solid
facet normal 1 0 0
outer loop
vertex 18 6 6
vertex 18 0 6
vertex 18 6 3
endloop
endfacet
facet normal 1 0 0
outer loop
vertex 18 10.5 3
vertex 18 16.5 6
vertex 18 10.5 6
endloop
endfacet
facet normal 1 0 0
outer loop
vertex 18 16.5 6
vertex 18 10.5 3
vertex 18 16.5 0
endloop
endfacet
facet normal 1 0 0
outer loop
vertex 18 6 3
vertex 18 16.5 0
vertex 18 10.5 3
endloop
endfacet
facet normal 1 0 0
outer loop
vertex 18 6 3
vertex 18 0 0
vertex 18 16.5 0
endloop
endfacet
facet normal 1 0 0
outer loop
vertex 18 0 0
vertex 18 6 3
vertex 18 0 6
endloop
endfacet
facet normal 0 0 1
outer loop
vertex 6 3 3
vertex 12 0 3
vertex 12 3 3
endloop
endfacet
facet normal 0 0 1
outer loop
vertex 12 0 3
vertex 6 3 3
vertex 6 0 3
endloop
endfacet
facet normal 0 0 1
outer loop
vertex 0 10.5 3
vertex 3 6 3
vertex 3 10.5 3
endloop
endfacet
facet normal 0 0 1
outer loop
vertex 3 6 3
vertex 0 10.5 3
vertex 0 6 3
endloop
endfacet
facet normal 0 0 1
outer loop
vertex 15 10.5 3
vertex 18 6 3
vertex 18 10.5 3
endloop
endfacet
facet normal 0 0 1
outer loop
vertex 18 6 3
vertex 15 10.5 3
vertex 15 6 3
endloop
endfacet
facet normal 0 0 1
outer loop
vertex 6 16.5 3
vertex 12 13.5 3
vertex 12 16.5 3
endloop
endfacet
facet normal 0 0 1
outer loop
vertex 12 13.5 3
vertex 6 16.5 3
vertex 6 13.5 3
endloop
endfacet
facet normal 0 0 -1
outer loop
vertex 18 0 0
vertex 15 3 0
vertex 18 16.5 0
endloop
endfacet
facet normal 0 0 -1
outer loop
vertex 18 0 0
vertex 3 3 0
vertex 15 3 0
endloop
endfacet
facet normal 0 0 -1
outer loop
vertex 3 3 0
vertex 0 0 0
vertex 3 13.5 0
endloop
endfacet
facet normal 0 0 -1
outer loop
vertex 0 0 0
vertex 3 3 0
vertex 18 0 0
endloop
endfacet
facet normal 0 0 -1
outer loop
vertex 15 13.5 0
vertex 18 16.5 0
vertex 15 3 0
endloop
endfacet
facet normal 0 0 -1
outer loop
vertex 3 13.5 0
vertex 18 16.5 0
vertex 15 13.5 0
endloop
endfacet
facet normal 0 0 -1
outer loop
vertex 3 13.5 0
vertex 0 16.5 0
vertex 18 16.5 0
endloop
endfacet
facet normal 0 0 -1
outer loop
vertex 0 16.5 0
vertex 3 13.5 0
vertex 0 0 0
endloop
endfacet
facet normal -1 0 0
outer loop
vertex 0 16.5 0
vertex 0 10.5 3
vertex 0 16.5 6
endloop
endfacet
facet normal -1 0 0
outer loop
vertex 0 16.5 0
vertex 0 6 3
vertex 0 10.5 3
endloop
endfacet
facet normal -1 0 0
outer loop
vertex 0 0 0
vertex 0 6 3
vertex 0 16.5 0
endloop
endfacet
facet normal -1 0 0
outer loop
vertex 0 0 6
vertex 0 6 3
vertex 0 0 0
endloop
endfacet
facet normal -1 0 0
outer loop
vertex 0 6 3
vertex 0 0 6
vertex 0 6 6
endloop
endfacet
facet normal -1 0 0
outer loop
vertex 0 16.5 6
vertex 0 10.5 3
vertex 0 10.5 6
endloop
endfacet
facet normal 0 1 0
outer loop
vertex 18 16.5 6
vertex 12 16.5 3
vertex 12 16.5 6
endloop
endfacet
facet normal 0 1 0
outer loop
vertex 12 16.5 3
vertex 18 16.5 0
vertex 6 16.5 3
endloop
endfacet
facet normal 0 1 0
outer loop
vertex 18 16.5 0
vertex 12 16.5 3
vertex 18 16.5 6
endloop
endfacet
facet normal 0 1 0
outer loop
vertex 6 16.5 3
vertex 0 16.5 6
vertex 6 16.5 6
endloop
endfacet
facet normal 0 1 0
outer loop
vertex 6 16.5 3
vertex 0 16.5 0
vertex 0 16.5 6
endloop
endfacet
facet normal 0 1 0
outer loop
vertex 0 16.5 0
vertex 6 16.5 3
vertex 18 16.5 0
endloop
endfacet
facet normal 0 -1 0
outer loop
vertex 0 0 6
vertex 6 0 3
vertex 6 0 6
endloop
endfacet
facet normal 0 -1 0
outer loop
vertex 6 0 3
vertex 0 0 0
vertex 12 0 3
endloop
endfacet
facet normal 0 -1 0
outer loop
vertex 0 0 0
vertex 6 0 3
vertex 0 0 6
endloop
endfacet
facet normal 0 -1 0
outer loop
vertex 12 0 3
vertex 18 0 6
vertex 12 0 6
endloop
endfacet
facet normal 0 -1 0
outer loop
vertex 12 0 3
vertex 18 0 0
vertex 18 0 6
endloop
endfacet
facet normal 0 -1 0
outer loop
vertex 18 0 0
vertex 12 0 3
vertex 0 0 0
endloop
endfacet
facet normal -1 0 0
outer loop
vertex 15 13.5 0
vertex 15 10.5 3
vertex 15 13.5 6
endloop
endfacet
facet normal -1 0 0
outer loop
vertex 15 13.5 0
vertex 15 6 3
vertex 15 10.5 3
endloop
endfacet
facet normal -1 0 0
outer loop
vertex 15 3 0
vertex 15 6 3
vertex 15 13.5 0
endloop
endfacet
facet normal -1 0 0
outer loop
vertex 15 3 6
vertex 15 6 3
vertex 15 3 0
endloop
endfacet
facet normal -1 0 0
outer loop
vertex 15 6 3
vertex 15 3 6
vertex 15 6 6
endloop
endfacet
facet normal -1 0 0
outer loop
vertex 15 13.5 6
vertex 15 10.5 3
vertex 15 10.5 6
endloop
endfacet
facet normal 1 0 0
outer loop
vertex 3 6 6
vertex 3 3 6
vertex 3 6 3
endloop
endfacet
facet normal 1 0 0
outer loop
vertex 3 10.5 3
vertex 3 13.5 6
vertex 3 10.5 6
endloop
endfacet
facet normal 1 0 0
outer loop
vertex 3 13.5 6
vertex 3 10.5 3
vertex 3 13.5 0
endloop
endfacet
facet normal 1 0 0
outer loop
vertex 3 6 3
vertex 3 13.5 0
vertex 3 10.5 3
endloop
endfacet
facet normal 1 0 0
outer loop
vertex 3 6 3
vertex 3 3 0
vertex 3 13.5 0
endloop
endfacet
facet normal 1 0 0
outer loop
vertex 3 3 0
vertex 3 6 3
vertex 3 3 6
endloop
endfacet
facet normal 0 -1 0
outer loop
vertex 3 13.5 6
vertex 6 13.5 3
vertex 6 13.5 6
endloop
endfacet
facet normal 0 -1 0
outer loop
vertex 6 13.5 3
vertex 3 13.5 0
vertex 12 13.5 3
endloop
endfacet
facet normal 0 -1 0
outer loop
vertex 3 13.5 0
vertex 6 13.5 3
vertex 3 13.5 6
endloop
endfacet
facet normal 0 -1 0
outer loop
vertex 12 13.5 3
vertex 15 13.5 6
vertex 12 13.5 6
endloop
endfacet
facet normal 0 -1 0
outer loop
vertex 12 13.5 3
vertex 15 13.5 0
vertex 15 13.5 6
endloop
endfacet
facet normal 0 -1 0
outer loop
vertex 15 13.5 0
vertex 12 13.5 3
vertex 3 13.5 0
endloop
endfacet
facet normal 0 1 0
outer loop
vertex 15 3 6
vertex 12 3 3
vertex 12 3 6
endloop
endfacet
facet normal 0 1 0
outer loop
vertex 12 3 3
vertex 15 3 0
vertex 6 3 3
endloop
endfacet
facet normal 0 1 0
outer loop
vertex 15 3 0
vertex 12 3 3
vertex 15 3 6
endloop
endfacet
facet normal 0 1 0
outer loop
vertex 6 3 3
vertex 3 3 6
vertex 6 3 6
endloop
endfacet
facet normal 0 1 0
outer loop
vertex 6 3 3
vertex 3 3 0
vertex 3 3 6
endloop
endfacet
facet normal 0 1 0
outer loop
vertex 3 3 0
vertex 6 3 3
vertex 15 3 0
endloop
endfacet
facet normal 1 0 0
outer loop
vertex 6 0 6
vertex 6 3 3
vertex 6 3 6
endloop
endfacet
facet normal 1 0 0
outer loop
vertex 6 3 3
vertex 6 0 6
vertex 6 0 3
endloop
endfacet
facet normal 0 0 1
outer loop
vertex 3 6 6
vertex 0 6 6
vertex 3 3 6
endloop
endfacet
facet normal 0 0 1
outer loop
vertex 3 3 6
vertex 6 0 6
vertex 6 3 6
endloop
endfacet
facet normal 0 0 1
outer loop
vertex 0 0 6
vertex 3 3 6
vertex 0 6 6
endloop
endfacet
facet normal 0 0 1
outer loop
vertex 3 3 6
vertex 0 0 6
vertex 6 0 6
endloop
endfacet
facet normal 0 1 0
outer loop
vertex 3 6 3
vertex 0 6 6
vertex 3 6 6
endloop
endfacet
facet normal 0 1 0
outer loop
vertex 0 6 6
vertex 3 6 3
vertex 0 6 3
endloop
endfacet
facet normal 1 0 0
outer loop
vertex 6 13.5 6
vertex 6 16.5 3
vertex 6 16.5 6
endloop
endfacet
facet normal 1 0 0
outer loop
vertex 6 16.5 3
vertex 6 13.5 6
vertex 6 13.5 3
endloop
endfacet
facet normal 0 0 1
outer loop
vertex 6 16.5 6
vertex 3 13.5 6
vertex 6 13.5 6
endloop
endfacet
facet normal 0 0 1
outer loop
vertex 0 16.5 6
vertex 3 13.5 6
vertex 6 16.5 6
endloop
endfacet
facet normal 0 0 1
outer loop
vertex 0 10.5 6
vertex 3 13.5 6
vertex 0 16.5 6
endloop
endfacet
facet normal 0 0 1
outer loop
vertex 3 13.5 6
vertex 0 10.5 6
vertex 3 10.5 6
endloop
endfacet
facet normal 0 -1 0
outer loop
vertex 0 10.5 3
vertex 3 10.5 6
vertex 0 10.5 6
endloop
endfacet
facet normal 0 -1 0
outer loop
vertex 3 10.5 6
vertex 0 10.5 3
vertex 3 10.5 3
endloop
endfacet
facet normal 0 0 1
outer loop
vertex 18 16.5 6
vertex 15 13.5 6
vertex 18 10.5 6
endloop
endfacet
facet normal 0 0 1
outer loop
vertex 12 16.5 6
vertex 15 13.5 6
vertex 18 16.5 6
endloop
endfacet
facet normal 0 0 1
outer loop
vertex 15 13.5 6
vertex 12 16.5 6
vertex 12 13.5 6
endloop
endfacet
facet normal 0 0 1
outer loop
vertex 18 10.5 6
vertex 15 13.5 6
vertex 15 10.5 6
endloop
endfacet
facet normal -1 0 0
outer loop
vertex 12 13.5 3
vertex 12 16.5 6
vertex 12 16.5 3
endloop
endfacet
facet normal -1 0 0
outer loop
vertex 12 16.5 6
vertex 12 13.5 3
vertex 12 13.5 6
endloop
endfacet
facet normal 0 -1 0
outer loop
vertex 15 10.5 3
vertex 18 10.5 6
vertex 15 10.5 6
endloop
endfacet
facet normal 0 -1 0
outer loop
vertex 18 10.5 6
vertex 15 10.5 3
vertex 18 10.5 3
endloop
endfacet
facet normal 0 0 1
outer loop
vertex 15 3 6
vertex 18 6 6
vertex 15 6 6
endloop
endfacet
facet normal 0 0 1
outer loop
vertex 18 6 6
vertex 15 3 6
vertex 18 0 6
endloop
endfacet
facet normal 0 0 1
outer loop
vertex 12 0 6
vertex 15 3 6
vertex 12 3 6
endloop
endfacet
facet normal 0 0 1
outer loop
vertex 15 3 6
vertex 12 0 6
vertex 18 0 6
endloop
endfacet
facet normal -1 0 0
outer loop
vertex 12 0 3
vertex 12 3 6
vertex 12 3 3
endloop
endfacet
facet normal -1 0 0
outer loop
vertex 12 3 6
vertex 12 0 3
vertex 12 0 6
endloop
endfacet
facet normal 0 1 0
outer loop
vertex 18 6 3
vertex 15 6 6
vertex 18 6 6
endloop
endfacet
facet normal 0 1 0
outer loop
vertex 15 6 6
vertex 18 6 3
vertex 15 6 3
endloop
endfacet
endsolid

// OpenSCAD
pot_width = 12;
pot_length = 10.5;
pot_height = 3;
pot_margin = 6;

legs_height = 3;

difference() {
    cube([pot_width + pot_margin, pot_length + pot_margin, pot_height]);
    translate([pot_margin/2, pot_margin/2, 0]) {
        cube([pot_width, pot_length, pot_height]);
    }
}

difference() {
    union() {
        translate([0, 0, pot_height]) {
            cube([pot_margin, pot_margin, legs_height]);
        }

        translate([0, pot_length, pot_height]) {
            cube([pot_margin, pot_margin, legs_height]);
        }

        translate([pot_width, pot_length, pot_height]) {
            cube([pot_margin, pot_margin, legs_height]);
        }

        translate([pot_width, 0, pot_height]) {
            cube([pot_margin, pot_margin, legs_height]);
        }
    }
    
    translate([pot_margin/2, pot_margin/2, 0]) {
        cube([pot_width, pot_length, pot_height*3]);
    }
}
    
